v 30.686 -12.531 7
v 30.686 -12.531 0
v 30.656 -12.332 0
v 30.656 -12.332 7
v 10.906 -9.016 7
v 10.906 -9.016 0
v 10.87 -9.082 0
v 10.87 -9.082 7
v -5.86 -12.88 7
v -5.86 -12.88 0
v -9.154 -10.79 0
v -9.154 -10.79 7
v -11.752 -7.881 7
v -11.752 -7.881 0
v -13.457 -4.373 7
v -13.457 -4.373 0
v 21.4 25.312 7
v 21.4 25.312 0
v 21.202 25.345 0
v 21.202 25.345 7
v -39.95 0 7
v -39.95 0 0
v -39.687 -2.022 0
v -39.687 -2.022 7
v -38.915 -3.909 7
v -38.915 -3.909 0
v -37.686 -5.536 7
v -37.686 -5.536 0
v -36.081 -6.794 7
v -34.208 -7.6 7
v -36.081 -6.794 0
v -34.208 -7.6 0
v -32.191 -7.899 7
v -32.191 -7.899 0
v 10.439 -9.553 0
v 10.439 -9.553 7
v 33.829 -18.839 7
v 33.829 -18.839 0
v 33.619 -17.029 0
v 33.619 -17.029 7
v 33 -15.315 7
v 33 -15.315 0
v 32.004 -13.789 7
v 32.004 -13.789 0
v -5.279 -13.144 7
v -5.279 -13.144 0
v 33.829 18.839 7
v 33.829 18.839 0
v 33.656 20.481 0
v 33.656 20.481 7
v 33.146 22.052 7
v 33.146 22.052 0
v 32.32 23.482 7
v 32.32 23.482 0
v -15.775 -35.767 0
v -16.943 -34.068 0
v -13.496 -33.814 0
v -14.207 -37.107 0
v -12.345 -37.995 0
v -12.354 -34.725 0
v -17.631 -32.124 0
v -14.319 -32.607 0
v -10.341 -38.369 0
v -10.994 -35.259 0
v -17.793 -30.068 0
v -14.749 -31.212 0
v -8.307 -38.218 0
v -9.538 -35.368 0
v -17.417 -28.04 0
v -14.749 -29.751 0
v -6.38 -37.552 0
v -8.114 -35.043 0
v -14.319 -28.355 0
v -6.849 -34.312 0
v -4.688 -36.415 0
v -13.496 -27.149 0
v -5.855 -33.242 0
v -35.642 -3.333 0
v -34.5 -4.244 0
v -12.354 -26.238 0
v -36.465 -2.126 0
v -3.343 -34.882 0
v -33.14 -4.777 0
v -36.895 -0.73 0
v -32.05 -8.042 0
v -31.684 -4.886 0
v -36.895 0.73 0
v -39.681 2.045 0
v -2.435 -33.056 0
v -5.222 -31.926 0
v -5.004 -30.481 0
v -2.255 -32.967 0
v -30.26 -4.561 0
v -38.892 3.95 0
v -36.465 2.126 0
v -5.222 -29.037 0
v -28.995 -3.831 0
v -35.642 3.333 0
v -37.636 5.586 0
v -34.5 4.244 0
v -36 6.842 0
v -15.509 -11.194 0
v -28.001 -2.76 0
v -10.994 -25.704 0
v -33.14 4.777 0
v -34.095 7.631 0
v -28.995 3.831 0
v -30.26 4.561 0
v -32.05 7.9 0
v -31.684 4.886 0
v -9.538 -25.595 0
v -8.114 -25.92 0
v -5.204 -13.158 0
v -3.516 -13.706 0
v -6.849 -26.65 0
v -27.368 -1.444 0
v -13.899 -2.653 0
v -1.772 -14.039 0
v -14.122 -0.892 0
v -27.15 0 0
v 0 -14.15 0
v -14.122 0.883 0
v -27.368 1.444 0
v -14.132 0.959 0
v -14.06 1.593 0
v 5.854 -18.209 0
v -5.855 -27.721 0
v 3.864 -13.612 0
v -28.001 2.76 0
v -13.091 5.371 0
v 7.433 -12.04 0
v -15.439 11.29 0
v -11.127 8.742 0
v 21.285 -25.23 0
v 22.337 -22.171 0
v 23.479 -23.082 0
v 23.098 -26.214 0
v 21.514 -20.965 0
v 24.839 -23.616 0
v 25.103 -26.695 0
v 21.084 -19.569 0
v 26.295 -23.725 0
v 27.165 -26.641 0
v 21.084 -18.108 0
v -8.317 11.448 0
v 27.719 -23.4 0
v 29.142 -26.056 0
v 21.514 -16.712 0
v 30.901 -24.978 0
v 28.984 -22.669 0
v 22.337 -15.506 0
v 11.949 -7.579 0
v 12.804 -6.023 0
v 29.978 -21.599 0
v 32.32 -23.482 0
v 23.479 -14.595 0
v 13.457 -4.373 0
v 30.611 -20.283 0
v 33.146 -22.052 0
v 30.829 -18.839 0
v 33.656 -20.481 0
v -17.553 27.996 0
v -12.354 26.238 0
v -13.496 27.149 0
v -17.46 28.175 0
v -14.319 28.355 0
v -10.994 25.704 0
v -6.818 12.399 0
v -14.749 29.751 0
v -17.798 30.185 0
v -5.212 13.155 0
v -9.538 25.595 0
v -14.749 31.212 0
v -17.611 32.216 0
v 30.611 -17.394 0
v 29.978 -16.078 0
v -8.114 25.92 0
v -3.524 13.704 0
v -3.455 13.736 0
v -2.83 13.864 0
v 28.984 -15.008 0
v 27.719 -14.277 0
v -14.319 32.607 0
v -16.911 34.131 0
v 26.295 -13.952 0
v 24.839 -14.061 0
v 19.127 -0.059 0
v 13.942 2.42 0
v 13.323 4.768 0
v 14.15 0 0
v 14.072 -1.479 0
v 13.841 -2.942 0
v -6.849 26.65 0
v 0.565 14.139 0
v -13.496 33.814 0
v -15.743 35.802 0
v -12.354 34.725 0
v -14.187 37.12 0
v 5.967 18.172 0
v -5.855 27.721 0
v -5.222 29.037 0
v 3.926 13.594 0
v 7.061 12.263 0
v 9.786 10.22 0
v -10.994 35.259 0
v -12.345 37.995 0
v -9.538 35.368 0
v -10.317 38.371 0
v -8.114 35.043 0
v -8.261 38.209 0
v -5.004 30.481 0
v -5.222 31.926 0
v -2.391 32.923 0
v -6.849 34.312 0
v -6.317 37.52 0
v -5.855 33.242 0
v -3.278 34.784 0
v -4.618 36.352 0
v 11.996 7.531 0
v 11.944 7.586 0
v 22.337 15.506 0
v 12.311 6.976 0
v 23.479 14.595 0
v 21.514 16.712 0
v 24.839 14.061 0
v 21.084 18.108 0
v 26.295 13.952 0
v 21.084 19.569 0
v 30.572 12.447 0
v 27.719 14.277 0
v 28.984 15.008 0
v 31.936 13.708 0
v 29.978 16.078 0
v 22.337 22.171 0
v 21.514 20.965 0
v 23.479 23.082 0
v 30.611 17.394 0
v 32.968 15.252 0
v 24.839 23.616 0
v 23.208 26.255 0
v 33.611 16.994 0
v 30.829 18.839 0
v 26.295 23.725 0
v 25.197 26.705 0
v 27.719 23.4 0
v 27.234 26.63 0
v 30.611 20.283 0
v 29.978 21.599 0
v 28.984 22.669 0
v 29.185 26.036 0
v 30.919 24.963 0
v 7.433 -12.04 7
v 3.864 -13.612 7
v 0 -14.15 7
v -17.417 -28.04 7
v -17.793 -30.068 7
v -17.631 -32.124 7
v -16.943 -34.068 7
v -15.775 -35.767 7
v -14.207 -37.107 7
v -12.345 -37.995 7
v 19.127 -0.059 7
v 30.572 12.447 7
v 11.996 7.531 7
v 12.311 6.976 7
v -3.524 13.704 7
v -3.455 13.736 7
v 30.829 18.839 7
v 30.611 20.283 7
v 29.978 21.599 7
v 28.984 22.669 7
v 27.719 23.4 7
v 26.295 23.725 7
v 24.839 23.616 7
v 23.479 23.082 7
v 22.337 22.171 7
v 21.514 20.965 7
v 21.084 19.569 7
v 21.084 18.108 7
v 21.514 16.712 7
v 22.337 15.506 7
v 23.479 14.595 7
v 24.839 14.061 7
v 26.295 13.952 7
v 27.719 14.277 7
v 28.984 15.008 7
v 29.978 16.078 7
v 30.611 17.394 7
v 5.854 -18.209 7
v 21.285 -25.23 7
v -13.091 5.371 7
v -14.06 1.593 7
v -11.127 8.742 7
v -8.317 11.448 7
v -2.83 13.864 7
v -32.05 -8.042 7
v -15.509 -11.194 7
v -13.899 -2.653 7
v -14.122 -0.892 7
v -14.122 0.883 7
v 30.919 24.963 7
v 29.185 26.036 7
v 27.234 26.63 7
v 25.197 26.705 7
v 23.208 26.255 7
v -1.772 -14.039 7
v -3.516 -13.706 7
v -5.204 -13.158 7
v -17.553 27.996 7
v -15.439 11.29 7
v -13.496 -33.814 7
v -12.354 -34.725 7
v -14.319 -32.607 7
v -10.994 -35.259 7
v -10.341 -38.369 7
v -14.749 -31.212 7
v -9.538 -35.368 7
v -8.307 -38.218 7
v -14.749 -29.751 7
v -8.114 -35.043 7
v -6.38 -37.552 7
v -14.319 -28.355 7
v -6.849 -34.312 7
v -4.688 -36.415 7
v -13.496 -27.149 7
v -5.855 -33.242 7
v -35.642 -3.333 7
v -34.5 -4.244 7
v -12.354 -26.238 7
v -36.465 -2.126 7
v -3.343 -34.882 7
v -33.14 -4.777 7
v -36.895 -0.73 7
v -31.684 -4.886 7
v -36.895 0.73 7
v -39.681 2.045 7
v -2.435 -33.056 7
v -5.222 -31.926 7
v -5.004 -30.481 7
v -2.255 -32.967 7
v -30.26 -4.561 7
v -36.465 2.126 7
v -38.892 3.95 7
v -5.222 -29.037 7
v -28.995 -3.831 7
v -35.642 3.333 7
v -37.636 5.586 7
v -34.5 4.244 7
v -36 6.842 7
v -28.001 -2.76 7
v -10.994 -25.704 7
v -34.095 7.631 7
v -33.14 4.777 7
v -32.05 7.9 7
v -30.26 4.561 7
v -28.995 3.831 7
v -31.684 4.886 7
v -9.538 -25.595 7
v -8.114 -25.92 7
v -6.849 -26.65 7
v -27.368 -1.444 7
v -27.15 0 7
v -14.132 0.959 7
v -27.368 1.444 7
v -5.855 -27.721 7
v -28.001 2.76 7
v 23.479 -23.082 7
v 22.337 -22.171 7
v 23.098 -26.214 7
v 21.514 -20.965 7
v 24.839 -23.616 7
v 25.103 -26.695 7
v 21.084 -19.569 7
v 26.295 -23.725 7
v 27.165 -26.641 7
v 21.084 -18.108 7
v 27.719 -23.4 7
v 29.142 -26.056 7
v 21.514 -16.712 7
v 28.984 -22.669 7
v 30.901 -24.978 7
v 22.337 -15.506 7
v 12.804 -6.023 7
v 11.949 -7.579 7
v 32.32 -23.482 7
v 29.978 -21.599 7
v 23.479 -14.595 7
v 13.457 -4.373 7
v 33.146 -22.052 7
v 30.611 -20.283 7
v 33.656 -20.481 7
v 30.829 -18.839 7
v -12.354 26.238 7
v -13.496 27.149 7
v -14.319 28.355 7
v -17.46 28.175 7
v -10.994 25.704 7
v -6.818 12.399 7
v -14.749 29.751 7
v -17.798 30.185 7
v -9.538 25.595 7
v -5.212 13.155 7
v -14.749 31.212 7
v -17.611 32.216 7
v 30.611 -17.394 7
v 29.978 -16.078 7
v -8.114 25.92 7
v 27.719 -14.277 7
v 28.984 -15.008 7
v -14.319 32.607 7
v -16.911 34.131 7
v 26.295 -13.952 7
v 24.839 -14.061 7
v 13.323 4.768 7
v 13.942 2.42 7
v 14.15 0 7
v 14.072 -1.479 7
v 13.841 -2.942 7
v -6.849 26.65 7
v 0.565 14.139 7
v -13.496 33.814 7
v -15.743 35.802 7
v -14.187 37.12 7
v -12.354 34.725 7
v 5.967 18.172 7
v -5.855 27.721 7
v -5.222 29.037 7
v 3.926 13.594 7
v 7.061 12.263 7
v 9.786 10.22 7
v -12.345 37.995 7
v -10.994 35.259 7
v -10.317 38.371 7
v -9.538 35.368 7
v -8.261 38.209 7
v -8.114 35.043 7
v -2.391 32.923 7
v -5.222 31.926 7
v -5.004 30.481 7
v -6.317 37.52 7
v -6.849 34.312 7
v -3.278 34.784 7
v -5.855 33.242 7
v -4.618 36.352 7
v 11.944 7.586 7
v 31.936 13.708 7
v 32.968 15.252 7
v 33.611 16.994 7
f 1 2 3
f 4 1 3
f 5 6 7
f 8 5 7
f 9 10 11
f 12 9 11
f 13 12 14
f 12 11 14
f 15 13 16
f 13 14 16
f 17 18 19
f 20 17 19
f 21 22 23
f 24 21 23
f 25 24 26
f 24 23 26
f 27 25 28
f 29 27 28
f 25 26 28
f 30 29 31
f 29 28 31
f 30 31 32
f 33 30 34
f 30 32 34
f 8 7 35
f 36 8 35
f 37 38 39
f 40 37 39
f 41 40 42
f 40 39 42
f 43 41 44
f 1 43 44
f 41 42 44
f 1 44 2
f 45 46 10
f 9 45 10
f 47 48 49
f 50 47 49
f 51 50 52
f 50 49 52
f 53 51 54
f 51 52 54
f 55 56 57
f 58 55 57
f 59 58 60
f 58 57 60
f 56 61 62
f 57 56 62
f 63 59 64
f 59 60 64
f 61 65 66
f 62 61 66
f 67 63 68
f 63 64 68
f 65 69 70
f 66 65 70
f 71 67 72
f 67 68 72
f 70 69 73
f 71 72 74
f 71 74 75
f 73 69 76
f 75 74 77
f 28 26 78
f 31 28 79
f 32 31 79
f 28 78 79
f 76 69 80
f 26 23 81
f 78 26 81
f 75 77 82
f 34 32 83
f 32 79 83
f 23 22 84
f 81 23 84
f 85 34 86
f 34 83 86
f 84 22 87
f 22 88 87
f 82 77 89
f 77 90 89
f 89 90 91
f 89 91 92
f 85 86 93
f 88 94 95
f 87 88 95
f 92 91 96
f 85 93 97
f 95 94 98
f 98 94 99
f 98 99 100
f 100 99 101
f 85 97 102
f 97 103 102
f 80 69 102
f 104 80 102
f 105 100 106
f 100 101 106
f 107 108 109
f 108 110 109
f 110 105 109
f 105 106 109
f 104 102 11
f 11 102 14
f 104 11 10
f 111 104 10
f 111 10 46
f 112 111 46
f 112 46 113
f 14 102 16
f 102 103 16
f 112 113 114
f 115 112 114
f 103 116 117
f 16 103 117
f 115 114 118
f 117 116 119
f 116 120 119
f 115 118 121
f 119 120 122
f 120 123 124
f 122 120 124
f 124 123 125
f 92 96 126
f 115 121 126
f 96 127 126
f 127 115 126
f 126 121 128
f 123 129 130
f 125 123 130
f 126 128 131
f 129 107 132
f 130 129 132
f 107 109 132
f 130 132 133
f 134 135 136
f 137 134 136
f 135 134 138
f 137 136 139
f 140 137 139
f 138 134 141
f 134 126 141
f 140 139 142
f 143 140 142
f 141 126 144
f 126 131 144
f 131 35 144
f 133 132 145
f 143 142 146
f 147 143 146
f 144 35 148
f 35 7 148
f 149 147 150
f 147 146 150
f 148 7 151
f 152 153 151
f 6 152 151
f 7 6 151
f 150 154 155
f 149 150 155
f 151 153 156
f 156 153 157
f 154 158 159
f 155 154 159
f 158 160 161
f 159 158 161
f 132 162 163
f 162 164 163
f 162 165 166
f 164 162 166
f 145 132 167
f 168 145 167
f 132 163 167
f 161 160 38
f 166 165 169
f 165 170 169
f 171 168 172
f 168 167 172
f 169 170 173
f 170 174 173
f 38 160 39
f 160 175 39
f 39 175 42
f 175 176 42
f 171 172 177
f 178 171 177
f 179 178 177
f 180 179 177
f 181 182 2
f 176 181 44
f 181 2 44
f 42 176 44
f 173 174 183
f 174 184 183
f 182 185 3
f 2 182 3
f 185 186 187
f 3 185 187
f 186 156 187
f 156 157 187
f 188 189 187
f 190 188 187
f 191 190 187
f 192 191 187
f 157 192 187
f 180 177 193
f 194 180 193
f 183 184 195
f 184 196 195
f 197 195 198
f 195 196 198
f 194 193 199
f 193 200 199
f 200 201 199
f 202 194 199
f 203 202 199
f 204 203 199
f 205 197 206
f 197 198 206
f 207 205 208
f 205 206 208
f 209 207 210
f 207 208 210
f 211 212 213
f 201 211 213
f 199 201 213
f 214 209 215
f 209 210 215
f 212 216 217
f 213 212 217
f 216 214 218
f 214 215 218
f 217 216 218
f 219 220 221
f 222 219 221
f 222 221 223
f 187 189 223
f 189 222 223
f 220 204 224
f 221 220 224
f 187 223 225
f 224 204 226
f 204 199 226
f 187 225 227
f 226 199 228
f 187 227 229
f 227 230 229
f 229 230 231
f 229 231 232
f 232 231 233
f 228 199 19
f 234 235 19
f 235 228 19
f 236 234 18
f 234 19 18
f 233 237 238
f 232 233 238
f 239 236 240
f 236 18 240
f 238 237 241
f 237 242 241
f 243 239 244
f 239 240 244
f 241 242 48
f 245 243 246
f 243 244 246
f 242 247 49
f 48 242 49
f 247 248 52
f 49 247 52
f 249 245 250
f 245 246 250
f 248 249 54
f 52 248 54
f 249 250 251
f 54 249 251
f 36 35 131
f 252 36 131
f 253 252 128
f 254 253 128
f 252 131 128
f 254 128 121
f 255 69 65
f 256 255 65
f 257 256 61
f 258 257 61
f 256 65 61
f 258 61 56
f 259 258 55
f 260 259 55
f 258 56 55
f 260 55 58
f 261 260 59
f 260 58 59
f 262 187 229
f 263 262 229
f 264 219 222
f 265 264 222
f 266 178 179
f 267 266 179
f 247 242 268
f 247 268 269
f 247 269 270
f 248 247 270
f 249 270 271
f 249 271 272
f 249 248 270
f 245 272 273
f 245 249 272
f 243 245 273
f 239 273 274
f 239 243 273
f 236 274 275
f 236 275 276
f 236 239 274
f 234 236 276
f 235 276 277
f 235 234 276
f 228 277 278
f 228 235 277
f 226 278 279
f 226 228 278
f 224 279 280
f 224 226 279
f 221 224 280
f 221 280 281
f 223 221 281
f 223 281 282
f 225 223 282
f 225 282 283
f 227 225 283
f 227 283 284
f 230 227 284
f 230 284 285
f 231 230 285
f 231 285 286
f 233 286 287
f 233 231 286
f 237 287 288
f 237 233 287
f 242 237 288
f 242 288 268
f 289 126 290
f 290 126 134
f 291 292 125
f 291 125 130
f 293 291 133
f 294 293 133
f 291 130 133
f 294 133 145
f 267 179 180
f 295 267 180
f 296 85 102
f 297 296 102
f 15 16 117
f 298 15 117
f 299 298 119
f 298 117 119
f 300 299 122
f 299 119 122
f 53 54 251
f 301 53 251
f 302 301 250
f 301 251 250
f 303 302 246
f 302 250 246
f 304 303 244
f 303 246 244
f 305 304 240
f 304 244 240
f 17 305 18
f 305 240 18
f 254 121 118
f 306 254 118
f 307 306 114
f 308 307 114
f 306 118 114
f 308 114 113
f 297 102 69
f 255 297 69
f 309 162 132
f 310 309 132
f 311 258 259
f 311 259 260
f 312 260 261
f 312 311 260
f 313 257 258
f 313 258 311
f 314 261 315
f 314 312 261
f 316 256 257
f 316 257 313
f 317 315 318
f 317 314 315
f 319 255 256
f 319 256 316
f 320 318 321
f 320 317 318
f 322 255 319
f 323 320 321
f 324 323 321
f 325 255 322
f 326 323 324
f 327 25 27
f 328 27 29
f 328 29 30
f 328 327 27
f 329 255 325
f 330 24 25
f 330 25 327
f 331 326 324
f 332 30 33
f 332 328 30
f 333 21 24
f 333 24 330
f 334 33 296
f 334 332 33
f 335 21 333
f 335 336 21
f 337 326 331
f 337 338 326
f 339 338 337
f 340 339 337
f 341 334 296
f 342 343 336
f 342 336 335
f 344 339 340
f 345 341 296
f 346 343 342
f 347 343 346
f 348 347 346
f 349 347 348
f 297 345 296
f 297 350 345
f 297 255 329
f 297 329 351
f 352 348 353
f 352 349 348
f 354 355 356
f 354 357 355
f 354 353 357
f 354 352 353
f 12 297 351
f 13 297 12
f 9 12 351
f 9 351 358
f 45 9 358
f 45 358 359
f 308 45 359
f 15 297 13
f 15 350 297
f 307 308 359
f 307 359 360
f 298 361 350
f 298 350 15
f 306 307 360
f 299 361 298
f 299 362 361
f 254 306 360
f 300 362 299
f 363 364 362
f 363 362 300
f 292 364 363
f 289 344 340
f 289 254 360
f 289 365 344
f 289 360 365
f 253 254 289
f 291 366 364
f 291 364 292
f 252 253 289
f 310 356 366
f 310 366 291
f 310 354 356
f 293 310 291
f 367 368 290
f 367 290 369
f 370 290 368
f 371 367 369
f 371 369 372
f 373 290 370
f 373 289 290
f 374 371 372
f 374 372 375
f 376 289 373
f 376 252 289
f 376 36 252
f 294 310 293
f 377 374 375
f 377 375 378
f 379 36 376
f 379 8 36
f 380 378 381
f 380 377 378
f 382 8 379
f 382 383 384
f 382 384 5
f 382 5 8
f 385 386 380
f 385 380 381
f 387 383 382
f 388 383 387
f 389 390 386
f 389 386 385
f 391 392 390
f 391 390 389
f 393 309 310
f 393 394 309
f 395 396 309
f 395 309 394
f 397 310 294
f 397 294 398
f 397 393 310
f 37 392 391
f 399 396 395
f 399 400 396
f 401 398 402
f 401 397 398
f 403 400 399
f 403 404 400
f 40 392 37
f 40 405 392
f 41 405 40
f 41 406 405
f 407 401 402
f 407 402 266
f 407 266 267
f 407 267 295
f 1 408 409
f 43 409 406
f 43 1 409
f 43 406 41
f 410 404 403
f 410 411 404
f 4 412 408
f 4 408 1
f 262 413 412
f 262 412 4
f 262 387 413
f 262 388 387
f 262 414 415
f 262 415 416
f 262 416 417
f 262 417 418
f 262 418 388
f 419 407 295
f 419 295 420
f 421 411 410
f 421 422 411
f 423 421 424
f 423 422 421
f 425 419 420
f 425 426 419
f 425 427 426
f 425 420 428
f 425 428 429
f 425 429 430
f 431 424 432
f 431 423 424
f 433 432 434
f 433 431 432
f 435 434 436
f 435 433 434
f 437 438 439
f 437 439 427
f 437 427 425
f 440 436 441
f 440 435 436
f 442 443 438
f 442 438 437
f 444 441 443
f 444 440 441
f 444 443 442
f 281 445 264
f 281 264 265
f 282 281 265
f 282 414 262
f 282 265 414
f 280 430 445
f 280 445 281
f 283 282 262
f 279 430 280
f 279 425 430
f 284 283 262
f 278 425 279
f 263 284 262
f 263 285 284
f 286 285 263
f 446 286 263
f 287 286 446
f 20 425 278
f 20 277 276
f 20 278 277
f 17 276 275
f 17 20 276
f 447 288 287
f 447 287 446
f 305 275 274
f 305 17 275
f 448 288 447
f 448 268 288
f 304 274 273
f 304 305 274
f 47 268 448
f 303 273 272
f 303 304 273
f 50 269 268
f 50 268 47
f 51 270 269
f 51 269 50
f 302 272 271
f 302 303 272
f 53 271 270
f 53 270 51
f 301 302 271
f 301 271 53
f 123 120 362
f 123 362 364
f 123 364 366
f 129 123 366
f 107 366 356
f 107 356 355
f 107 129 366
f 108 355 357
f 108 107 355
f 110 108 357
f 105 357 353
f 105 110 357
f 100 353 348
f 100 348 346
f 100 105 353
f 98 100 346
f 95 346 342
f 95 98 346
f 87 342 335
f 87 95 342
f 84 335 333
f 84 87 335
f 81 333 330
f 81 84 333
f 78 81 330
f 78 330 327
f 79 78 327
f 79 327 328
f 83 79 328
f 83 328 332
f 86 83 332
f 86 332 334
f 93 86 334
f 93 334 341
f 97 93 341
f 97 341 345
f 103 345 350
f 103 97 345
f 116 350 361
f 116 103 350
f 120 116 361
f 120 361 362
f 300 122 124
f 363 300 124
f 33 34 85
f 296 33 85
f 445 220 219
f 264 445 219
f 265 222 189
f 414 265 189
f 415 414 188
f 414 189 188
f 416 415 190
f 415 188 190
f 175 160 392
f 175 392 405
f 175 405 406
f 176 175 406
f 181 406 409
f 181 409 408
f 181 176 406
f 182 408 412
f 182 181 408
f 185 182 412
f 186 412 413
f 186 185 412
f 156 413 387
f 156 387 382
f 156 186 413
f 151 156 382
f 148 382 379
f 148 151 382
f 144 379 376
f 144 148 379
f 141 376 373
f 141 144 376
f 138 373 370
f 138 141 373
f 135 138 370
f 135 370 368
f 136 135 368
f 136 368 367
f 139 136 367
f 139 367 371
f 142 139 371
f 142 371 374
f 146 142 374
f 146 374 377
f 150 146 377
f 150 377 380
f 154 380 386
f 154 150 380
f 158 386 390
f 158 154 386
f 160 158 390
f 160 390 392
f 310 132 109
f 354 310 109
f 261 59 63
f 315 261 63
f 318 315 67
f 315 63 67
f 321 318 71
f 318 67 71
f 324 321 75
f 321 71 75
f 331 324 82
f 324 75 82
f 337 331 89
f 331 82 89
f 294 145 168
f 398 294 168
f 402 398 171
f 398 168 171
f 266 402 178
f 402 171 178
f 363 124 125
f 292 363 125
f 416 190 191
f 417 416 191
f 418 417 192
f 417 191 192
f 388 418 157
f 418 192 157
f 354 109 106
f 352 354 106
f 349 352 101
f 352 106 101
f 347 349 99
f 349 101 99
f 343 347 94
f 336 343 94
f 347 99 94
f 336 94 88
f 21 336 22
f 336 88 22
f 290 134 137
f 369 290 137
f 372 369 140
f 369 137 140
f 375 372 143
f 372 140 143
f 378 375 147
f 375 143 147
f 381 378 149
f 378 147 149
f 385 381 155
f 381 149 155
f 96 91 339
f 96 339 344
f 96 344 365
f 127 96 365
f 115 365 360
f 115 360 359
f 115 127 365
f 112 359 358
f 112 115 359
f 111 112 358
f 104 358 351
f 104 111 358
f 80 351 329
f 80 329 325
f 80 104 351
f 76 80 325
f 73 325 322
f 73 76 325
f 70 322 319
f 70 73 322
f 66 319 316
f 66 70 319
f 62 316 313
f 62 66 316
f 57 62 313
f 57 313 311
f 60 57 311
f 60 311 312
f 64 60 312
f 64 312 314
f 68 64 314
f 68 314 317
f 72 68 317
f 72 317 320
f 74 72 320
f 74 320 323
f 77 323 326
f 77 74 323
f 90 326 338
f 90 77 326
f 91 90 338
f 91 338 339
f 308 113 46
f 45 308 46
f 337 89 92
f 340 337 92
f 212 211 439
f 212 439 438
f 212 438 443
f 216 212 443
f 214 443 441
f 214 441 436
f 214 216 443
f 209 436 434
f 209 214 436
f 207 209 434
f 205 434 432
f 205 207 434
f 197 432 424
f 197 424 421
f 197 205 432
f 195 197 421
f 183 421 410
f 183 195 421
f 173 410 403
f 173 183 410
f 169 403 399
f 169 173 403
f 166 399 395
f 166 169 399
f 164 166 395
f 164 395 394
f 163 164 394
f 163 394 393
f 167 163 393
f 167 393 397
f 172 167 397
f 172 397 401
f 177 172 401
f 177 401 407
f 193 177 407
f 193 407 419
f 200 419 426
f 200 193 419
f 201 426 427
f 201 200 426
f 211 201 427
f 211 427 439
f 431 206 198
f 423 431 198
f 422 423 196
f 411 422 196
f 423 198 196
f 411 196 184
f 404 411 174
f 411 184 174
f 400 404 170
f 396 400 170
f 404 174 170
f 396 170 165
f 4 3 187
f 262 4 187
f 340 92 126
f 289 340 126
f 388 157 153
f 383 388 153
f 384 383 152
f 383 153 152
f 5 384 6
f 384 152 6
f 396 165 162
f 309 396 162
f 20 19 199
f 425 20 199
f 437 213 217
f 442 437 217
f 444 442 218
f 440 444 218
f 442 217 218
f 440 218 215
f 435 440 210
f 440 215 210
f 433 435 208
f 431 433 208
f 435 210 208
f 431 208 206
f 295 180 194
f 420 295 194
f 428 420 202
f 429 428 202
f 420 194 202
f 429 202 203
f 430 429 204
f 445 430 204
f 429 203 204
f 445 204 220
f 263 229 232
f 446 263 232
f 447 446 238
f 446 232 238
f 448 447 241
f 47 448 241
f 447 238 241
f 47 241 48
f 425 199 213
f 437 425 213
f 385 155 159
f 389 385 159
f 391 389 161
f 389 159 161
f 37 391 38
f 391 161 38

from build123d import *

# Parameters (mm, degrees)
F0_R     = 4.9
F1_DEPTH = 7


with BuildPart() as f1:
    # F0 (on Top) → F1 (new body)
    with BuildSketch(Plane.XY):
        with BuildLine():
            ThreePointArc((14.15, 0), (13.9757900194, -2.2135476803), (13.4574497056, -4.3725904704))
            ThreePointArc((13.4574497056, -4.3725904704), (12.400978844, -6.8145596858), (10.9060417797, -9.0155838801))
            Line((10.9060417797, -9.0155838801), (10.8695159641, -9.0820527185))
            Line((10.8695159641, -9.0820527185), (19.1268249694, -0.0593384625))
            Line((19.1268249694, -0.0593384625), (11.9964105728, 7.5310153528))
            Line((11.9964105728, 7.5310153528), (12.3111266381, 6.9755760265))
            ThreePointArc((12.3111266381, 6.9755760265), (13.6825608336, 3.6069417844), (14.15, 0))
        make_face()
        with BuildLine():
            Line((10.8695159641, -9.0820527185), (10.4385144096, -9.5530056485))
            ThreePointArc((10.4385144096, -9.5530056485), (5.702958446, -12.9498557893), (0, -14.15))
            ThreePointArc((0, -14.15), (-2.6489181852, -13.8998464901), (-5.2041775461, -13.1582307347))
            Line((-5.2041775461, -13.1582307347), (-5.2786802657, -13.1440326205))
            Line((-5.2786802657, -13.1440326205), (5.8540797326, -18.2090281165))
            Line((5.8540797326, -18.2090281165), (10.8695159641, -9.0820527185))
        make_face()
        with BuildLine():
            Line((19.1268249694, -0.0593384625), (10.8695159641, -9.0820527185))
            Line((10.8695159641, -9.0820527185), (5.8540797326, -18.2090281165))
            Line((5.8540797326, -18.2090281165), (21.2854911766, -25.2297515915))
            ThreePointArc((21.2854911766, -25.2297515915), (19.5794245005, -14.1382025948), (30.685746847, -12.531116229))
            Line((30.685746847, -12.531116229), (30.6560666179, -12.3322609697))
            Line((30.6560666179, -12.3322609697), (19.1268249694, -0.0593384625))
        make_face()
        with BuildLine():
            ThreePointArc((8.3171613199, 11.4475904704), (10.3131446045, 9.6882169859), (11.9444820487, 7.5862934684))
            Line((11.9444820487, 7.5862934684), (11.9964105728, 7.5310153528))
            Line((11.9964105728, 7.5310153528), (5.9669481954, 18.1723549299))
            Line((5.9669481954, 18.1723549299), (-3.4553264872, 13.7364761763))
            Line((-3.4553264872, 13.7364761763), (-2.8298212171, 13.8641484369))
            ThreePointArc((-2.8298212171, 13.8641484369), (2.9979432037, 13.8287684393), (8.3171613199, 11.4475904704))
        make_face()
        with BuildLine():
            Line((5.9669481954, 18.1723549299), (11.9964105728, 7.5310153528))
            Line((11.9964105728, 7.5310153528), (19.1268249694, -0.0593384625))
            Line((19.1268249694, -0.0593384625), (30.5724981628, 12.4472830804))
            ThreePointArc((30.5724981628, 12.4472830804), (19.4966046172, 14.2521943848), (21.4002170069, 25.311551623))
            Line((21.4002170069, 25.311551623), (21.2019227215, 25.3447737022))
            Line((21.2019227215, 25.3447737022), (5.9669481954, 18.1723549299))
        make_face()
        with BuildLine():
            Line((-2.2554315903, -32.9665301396), (5.8540797326, -18.2090281165))
            Line((5.8540797326, -18.2090281165), (-5.2786802657, -13.1440326205))
            Line((-5.2786802657, -13.1440326205), (-15.5088047218, -11.1944598156))
            Line((-15.5088047218, -11.1944598156), (-17.4173411484, -28.0401270917))
            ThreePointArc((-17.4173411484, -28.0401270917), (-8.6681623959, -22.6786234566), (-2.0039946697, -30.4813613473))
            ThreePointArc((-2.0039946697, -30.4813613473), (-2.1125879849, -31.7867279132), (-2.4353824853, -33.0562073695))
            Line((-2.4353824853, -33.0562073695), (-2.2554315903, -32.9665301396))
        make_face()
        with BuildLine():
            Line((-3.4553264872, 13.7364761763), (5.9669481954, 18.1723549299))
            Line((5.9669481954, 18.1723549299), (-2.390648191, 32.9225956028))
            ThreePointArc((-2.390648191, 32.9225956028), (-2.101256779, 31.7171936211), (-2.0039946697, 30.4813613473))
            ThreePointArc((-2.0039946697, 30.4813613473), (-8.7377949727, 22.6679127958), (-17.4596853701, 28.17451544))
            Line((-17.4596853701, 28.17451544), (-17.5525577492, 27.9961925549))
            Line((-17.5525577492, 27.9961925549), (-15.4390481756, 11.2904714648))
            Line((-15.4390481756, 11.2904714648), (-3.4553264872, 13.7364761763))
        make_face()
        with BuildLine():
            Line((32.3202289253, -23.4820208291), (21.2854911766, -25.2297515915))
            ThreePointArc((21.2854911766, -25.2297515915), (27.1648269435, -26.6412552267), (32.3202289253, -23.4820208291))
        make_face()
        with BuildLine():
            ThreePointArc((30.685746847, -12.531116229), (19.5794245005, -14.1382025948), (21.2854911766, -25.2297515915))
            Line((21.2854911766, -25.2297515915), (32.3202289253, -23.4820208291))
            Line((32.3202289253, -23.4820208291), (30.685746847, -12.531116229))
        make_face()
        with Locations((25.9289946697, -18.838517336)):
            Circle(F0_R, mode=Mode.SUBTRACT)
        with BuildLine():
            Line((-15.5088047218, -11.1944598156), (-5.2786802657, -13.1440326205))
            Line((-5.2786802657, -13.1440326205), (-5.8597700568, -12.8796581819))
            ThreePointArc((-5.8597700568, -12.8796581819), (-10.5537337042, -9.4255612513), (-13.4574497056, -4.3725904704))
            ThreePointArc((-13.4574497056, -4.3725904704), (-14.0381003158, -1.7760178835), (-14.1224003867, 0.8833500542))
            Line((-14.1224003867, 0.8833500542), (-14.1319197841, 0.9585938098))
            Line((-14.1319197841, 0.9585938098), (-15.5088047218, -11.1944598156))
        make_face()
        with BuildLine():
            Line((32.3202289253, 23.4820208291), (30.5724981628, 12.4472830804))
            ThreePointArc((30.5724981628, 12.4472830804), (32.9679462108, 15.251992388), (33.8289946697, 18.838517336))
            ThreePointArc((33.8289946697, 18.838517336), (33.4423411484, 21.2797515915), (32.3202289253, 23.4820208291))
        make_face()
        with BuildLine():
            ThreePointArc((21.4002170069, 25.311551623), (19.4966046172, 14.2521943848), (30.5724981628, 12.4472830804))
            Line((30.5724981628, 12.4472830804), (32.3202289253, 23.4820208291))
            Line((32.3202289253, 23.4820208291), (21.4002170069, 25.311551623))
        make_face()
        with Locations((25.9289946697, 18.838517336)):
            Circle(F0_R, mode=Mode.SUBTRACT)
        with BuildLine():
            Line((-3.5239458956, 13.7041710922), (-3.4553264872, 13.7364761763))
            Line((-3.4553264872, 13.7364761763), (-15.4390481756, 11.2904714648))
            Line((-15.4390481756, 11.2904714648), (-14.1319197841, 0.9585938098))
            Line((-14.1319197841, 0.9585938098), (-14.0600515027, 1.5929380844))
            ThreePointArc((-14.0600515027, 1.5929380844), (-12.2255248084, 7.1245381015), (-8.3171613199, 11.4475904704))
            ThreePointArc((-8.3171613199, 11.4475904704), (-6.0271049475, 12.8022070735), (-3.5239458956, 13.7041710922))
        make_face()
        with BuildLine():
            Line((-12.3452289253, 37.994707826), (-2.390648191, 32.9225956028))
            ThreePointArc((-2.390648191, 32.9225956028), (-6.3174697218, 37.5203128883), (-12.3452289253, 37.994707826))
        make_face()
        with BuildLine():
            ThreePointArc((-2.0039946697, 30.4813613473), (-2.101256779, 31.7171936211), (-2.390648191, 32.9225956028))
            Line((-2.390648191, 32.9225956028), (-12.3452289253, 37.994707826))
            Line((-12.3452289253, 37.994707826), (-17.4596853701, 28.17451544))
            ThreePointArc((-17.4596853701, 28.17451544), (-8.7377949727, 22.6679127958), (-2.0039946697, 30.4813613473))
        make_face()
        with Locations((-9.9039946697, 30.4813613473)):
            Circle(F0_R, mode=Mode.SUBTRACT)
        with BuildLine():
            Line((-12.3452289253, -37.994707826), (-2.4353824853, -33.0562073695))
            ThreePointArc((-2.4353824853, -33.0562073695), (-2.1125879849, -31.7867279132), (-2.0039946697, -30.4813613473))
            ThreePointArc((-2.0039946697, -30.4813613473), (-8.6681623959, -22.6786234566), (-17.4173411484, -28.0401270917))
            Line((-17.4173411484, -28.0401270917), (-12.3452289253, -37.994707826))
        make_face()
        with Locations((-9.9039946697, -30.4813613473)):
            Circle(F0_R, mode=Mode.SUBTRACT)
        with BuildLine():
            ThreePointArc((-12.3452289253, -37.994707826), (-6.3803844615, -37.5520169817), (-2.4353824853, -33.0562073695))
            Line((-2.4353824853, -33.0562073695), (-12.3452289253, -37.994707826))
        make_face()
        with BuildLine():
            Line((30.685746847, -12.531116229), (32.3202289253, -23.4820208291))
            ThreePointArc((32.3202289253, -23.4820208291), (33.4423411484, -21.2797515915), (33.8289946697, -18.838517336))
            ThreePointArc((33.8289946697, -18.838517336), (32.9996503041, -15.3149071277), (30.685746847, -12.531116229))
        make_face()
        with BuildLine():
            Line((-32.05, -8.0421751477), (-15.5088047218, -11.1944598156))
            Line((-15.5088047218, -11.1944598156), (-14.1319197841, 0.9585938098))
            Line((-14.1319197841, 0.9585938098), (-15.4390481756, 11.2904714648))
            Line((-15.4390481756, 11.2904714648), (-32.05, 7.9))
            ThreePointArc((-32.05, 7.9), (-26.4638564286, 5.5861435714), (-24.15, 0))
            ThreePointArc((-24.15, 0), (-26.5138947982, -5.6357376797), (-32.1908959985, -7.8987434645))
            Line((-32.1908959985, -7.8987434645), (-32.05, -8.0421751477))
        make_face()
        with BuildLine():
            ThreePointArc((32.3202289253, 23.4820208291), (27.2343612356, 26.6299240208), (21.4002170069, 25.311551623))
            Line((21.4002170069, 25.311551623), (32.3202289253, 23.4820208291))
        make_face()
        with BuildLine():
            Line((-17.4596853701, 28.17451544), (-12.3452289253, 37.994707826))
            ThreePointArc((-12.3452289253, 37.994707826), (-16.9106823157, 34.1305158016), (-17.4596853701, 28.17451544))
        make_face()
        with BuildLine():
            ThreePointArc((-17.4173411484, -28.0401270917), (-16.9429462108, -34.0678862952), (-12.3452289253, -37.994707826))
            Line((-12.3452289253, -37.994707826), (-17.4173411484, -28.0401270917))
        make_face()
        with BuildLine():
            Line((-39.95, 0), (-32.05, 7.9))
            ThreePointArc((-32.05, 7.9), (-37.6361435714, 5.5861435714), (-39.95, 0))
        make_face()
        with BuildLine():
            ThreePointArc((-24.15, 0), (-26.4638564286, 5.5861435714), (-32.05, 7.9))
            Line((-32.05, 7.9), (-39.95, 0))
            Line((-39.95, 0), (-32.1908959985, -7.8987434645))
            ThreePointArc((-32.1908959985, -7.8987434645), (-26.5138947982, -5.6357376797), (-24.15, 0))
        make_face()
        with Locations((-32.05, 0)):
            Circle(F0_R, mode=Mode.SUBTRACT)
        with BuildLine():
            ThreePointArc((-39.95, 0), (-37.6857376797, -5.5361052018), (-32.1908959985, -7.8987434645))
            Line((-32.1908959985, -7.8987434645), (-39.95, 0))
        make_face()
    extrude(amount=F1_DEPTH)


solid = f1.part
